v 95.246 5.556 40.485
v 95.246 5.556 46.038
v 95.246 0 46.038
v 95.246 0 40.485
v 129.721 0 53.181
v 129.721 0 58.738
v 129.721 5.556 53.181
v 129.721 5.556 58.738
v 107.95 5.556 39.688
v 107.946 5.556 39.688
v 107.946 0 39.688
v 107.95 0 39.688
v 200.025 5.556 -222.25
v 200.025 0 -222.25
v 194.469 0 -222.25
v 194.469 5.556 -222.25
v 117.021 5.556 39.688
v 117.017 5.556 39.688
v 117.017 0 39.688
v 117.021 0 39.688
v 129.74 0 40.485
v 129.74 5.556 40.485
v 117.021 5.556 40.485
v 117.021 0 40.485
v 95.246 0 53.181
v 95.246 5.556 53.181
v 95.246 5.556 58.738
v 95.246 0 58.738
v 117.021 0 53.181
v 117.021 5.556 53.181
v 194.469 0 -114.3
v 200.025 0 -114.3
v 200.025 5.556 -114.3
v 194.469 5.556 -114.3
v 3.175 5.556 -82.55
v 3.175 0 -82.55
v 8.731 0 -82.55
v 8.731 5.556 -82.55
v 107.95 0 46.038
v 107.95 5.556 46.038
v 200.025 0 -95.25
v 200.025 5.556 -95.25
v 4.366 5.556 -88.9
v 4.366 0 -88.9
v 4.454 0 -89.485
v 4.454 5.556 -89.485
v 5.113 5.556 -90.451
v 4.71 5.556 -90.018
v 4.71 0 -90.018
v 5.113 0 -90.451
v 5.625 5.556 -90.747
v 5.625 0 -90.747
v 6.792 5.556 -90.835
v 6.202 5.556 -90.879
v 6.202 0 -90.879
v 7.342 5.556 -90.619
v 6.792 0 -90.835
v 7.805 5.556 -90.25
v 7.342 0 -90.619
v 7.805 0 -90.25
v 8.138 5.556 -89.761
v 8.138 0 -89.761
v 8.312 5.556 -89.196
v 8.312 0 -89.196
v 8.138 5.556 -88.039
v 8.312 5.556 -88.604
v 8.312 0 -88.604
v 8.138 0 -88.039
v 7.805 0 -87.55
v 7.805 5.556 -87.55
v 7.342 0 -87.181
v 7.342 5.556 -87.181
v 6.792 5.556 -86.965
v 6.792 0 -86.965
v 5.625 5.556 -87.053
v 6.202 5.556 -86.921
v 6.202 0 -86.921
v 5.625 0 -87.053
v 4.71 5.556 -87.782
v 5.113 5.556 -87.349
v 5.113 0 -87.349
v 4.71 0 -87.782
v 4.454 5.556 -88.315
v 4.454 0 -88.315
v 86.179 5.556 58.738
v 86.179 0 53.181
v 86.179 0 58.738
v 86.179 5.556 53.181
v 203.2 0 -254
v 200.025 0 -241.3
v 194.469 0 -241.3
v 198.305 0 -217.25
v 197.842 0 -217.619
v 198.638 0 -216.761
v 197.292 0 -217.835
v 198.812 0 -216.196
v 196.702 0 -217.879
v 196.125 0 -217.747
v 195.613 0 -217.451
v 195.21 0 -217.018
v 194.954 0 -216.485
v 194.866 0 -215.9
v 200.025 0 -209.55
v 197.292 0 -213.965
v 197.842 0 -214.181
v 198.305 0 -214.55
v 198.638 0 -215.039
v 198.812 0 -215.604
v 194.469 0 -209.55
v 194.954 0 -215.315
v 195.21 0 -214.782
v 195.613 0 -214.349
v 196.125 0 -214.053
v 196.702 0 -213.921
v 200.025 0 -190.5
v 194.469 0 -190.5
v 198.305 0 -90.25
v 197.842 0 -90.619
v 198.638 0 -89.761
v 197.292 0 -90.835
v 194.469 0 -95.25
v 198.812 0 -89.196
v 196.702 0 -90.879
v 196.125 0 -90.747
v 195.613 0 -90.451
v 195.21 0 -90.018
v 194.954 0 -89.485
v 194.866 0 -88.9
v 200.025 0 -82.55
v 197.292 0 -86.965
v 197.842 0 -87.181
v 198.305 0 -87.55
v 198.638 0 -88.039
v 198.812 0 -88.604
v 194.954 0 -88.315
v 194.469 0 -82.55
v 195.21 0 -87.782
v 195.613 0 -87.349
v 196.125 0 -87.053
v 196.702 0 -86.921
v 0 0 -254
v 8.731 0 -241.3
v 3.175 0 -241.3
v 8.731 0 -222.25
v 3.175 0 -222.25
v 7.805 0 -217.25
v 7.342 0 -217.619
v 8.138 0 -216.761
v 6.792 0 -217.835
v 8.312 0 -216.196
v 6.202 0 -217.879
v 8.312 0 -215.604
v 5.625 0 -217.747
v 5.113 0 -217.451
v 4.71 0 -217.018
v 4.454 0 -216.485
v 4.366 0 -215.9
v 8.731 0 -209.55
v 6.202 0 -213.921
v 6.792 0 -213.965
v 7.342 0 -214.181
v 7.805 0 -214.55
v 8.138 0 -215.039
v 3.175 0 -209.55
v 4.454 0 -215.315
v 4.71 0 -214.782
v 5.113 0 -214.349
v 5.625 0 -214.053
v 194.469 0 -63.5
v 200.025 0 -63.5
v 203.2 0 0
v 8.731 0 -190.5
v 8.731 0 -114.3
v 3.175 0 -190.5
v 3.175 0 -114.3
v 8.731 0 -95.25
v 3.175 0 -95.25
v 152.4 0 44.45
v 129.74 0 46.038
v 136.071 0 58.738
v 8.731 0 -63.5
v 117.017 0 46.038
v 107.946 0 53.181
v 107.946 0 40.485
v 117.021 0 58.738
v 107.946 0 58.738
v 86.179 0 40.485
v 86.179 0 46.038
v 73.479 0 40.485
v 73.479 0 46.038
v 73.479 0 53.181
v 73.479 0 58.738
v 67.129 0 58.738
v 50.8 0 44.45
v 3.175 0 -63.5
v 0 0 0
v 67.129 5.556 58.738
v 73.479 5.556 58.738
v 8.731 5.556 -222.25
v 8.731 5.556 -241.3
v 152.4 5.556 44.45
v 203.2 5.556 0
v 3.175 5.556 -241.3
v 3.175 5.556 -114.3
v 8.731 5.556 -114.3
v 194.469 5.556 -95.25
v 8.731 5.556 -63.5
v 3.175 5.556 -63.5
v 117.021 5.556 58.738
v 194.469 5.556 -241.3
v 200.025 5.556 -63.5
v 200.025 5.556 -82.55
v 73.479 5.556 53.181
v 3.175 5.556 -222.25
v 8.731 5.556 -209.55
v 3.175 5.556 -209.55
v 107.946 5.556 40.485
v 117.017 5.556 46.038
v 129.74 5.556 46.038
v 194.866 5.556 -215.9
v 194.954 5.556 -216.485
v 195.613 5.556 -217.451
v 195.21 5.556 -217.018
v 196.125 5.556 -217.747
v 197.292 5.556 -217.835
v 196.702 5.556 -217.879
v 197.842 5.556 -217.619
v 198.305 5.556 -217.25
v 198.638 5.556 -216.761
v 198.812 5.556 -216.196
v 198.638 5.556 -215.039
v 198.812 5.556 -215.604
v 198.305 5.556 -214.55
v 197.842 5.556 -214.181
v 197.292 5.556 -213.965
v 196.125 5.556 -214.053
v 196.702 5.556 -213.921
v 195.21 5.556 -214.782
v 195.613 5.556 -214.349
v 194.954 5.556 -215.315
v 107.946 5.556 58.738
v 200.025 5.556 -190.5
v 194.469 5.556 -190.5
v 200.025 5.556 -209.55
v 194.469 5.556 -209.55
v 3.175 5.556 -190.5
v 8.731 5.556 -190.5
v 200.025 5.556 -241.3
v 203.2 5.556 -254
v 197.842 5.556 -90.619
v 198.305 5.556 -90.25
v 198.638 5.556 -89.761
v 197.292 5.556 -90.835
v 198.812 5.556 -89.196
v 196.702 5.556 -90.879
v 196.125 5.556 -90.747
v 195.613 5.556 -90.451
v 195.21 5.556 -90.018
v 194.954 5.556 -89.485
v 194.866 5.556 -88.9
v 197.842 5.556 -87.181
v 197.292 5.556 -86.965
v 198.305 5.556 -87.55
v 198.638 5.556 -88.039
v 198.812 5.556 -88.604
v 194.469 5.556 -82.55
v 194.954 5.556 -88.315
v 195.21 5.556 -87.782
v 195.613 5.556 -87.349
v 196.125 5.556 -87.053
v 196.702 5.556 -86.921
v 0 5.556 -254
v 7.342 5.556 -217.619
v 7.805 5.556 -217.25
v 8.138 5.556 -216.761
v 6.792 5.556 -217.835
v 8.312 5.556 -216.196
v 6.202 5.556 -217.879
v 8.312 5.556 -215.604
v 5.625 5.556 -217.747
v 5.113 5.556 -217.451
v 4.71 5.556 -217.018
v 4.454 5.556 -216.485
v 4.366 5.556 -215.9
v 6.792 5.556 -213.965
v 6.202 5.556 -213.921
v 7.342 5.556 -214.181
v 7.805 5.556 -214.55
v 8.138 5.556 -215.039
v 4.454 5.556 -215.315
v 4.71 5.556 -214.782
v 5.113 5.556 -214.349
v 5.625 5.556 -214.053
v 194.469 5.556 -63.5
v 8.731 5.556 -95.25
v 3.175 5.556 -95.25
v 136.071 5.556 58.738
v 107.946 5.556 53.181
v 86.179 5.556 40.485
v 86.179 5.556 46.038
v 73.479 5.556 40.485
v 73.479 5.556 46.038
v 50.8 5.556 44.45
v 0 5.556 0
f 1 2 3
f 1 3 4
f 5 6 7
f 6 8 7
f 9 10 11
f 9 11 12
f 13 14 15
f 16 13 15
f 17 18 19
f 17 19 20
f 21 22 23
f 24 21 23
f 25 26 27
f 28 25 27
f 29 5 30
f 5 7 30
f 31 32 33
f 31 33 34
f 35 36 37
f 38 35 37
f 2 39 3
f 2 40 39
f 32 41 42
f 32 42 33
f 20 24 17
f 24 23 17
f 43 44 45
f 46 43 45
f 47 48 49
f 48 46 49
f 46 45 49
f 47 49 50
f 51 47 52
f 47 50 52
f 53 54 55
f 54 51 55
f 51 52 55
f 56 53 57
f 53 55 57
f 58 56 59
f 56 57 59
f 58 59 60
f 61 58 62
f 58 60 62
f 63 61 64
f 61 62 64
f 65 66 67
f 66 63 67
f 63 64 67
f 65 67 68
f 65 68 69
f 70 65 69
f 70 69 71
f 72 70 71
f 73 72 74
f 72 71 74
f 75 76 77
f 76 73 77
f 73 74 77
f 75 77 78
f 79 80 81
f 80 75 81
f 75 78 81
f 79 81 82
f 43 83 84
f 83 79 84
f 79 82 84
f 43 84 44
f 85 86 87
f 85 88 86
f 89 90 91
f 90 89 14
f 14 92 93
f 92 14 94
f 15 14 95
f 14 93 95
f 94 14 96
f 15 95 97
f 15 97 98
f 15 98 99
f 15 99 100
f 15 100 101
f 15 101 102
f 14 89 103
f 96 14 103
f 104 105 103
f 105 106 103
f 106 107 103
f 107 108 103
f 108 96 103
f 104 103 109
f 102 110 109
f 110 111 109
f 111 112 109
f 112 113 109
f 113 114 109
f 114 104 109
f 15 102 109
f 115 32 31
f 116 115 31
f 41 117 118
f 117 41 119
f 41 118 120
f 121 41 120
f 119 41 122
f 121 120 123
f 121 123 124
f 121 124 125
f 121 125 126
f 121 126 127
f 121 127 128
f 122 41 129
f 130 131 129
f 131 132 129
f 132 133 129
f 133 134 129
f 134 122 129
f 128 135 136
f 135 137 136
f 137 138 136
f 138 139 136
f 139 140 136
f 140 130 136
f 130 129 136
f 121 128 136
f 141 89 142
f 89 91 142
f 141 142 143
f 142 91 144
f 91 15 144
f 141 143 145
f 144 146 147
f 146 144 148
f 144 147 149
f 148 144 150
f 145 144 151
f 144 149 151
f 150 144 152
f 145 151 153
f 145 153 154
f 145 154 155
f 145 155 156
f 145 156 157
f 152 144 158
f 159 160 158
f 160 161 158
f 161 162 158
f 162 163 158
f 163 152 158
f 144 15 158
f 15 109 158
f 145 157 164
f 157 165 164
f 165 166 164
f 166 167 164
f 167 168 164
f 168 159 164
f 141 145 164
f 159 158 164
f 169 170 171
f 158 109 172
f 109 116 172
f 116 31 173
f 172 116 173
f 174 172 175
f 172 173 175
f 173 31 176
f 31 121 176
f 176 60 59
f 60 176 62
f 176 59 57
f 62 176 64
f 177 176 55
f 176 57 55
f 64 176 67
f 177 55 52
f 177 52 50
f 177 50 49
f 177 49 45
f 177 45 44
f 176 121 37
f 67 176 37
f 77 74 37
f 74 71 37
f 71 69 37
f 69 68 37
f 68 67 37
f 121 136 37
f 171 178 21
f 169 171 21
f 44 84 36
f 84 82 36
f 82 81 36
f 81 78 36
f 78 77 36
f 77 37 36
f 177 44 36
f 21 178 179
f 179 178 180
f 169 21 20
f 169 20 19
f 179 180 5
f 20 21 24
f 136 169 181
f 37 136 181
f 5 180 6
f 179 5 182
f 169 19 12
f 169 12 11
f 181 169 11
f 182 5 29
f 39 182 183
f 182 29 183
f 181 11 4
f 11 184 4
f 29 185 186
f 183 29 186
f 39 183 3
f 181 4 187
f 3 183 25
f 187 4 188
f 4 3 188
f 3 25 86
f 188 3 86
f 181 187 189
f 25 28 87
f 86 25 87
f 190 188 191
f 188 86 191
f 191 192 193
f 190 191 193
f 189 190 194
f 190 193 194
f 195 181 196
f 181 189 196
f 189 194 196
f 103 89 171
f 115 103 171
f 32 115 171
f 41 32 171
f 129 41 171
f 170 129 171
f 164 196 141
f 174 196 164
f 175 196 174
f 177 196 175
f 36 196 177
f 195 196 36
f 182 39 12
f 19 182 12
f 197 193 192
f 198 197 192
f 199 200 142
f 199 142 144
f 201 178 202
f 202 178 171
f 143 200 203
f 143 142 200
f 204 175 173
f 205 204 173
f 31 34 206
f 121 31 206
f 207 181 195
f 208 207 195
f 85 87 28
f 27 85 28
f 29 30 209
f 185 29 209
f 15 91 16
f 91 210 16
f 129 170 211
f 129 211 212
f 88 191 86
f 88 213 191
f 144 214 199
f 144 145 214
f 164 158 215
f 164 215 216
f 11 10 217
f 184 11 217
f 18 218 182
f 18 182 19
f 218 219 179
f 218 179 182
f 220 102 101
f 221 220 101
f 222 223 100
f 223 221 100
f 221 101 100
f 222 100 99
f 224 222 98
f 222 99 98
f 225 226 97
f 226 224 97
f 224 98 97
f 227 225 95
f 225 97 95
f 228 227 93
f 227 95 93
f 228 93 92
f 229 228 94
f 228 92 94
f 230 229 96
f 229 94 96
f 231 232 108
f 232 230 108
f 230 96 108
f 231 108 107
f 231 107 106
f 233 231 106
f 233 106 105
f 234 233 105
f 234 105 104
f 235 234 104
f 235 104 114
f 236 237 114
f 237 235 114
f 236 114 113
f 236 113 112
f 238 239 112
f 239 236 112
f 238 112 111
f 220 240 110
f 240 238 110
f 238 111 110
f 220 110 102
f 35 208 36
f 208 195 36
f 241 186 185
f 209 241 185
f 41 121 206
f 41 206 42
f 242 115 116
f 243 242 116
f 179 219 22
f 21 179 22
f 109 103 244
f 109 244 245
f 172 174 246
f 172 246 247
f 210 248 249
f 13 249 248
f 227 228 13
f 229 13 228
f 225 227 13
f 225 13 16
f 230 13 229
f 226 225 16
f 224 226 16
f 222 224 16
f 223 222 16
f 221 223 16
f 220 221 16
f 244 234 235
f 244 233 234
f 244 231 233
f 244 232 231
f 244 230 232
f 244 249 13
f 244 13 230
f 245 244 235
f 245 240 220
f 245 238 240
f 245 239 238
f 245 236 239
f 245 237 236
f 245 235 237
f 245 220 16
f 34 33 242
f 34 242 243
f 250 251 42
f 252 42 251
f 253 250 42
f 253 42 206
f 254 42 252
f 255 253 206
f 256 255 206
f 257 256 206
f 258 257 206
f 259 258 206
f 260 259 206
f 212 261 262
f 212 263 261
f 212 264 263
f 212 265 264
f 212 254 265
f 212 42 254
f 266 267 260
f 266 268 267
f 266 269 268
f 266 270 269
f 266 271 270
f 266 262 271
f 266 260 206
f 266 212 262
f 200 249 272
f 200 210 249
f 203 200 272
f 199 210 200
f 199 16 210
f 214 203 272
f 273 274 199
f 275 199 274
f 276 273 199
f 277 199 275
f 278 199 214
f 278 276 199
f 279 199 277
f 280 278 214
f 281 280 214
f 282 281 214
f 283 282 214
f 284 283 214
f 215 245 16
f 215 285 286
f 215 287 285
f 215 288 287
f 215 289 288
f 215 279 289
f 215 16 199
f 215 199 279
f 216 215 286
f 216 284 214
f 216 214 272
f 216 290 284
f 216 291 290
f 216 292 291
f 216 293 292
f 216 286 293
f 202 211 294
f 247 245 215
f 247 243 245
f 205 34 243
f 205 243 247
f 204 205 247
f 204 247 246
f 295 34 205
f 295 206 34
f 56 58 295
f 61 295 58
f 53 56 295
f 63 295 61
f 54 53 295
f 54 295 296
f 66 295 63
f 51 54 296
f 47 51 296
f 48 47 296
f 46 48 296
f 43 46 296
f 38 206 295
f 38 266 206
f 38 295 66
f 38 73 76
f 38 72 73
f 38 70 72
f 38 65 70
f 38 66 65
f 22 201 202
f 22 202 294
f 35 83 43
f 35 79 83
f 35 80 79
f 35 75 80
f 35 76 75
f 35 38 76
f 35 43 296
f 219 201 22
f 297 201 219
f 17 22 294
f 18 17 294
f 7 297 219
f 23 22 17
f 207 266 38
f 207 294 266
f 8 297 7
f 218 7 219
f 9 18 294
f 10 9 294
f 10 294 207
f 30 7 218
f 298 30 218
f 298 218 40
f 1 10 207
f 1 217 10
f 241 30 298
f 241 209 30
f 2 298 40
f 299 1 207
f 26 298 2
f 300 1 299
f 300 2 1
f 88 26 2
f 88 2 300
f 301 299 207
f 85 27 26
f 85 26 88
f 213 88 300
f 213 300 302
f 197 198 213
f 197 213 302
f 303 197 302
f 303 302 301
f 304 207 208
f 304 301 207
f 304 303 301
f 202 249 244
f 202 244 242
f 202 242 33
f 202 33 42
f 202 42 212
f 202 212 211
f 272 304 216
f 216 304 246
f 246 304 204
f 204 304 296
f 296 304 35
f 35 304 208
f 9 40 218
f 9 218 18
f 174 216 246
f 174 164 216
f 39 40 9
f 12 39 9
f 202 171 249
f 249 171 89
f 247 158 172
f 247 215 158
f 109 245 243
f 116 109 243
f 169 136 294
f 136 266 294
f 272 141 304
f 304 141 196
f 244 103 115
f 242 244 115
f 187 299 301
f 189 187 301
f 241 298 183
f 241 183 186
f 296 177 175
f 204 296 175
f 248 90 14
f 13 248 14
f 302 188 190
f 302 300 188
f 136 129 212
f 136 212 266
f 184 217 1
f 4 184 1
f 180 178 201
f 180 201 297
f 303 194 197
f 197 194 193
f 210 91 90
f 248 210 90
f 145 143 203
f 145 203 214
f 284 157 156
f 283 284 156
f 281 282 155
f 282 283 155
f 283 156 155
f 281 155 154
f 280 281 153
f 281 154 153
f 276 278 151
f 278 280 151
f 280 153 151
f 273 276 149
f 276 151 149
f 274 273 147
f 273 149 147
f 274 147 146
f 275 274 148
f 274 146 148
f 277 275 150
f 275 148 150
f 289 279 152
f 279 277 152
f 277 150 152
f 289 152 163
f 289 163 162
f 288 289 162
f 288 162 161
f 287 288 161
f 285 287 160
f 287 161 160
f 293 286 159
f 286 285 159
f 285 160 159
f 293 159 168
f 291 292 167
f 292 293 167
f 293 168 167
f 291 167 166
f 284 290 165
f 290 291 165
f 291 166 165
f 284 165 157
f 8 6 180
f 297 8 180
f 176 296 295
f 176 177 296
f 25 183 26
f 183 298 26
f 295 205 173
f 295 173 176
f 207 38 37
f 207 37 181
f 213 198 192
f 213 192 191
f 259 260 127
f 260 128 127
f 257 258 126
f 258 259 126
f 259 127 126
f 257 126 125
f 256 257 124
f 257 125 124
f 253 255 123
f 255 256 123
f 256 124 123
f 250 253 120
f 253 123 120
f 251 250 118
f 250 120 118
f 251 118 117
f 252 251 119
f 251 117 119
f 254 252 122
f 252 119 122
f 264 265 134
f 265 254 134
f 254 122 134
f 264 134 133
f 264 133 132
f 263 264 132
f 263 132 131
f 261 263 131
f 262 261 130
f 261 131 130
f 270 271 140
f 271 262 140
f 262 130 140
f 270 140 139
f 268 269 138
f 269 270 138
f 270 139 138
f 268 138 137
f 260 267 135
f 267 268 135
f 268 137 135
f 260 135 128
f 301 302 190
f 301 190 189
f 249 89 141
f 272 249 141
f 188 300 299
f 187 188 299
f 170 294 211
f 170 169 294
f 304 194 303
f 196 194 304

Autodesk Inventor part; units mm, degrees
ref_plane "YZ Plane" through (0, 0, 0) normal (1, 0, 0) x (0, 1, 0)
ref_plane "XZ Plane" through (0, 0, 0) normal (0, 1, 0) x (-1, 0, 0)
ref_plane "XY Plane" through (0, 0, 0) normal (0, 0, 1) x (1, 0, 0)
sketch "Sketch1" plane through (0, 0, 0) normal (0, 1, 0) x (-1, 0, 0)
  point P0 (0, 0)
sketch "Sketch4" plane through (0, 0, 0) normal (0, 1, 0) x (-1, 0, 0)
  line L0 (-203.2, 0) -> (-203.2, -254)
  line L1 (-203.2, -254) -> (0, -254)
  line L2 (0, -254) -> (0, 0)
  line L3 (-101.6, 44.45) -> (-50.8, 44.45)
  line L4 (-50.8, 44.45) -> (0, 0)
  line L5 (-101.6, 44.45) -> (-152.4, 44.45)
  line L6 (-152.4, 44.45) -> (-203.2, 0)
  line L7 (-152.4, 44.45) -> (-136.0714, 58.7375)
  line L8 (-50.8, 44.45) -> (-67.1286, 58.7375)
  line L9 (-67.1286, 58.7375) -> (-136.0714, 58.7375)
  line L10 (0, -254) -> (0, -241.3)
  line L11 (-3.175, -241.3) -> (-3.175, -222.25)
  line L12 (-3.175, -222.25) -> (-9.525, -222.25)
  line L13 (-9.525, -222.25) -> (-9.525, -241.3)
  line L14 (-9.525, -241.3) -> (-3.175, -241.3)
  circle A0 centre (-6.35, -215.9) radius 4.7625
  circle A1 centre (-6.35, -215.9) radius 1.9844
  line L15 (-6.35, -209.55) -> (-9.525, -209.55)
  line L16 (-6.35, -209.55) -> (-3.175, -209.55)
  line L17 (-3.175, -209.55) -> (-3.175, -190.5)
  line L18 (-3.175, -190.5) -> (-9.525, -190.5)
  line L19 (-9.525, -190.5) -> (-9.525, -209.55)
  line L20 (-200.025, -241.3) -> (-200.025, -222.25)
  line L21 (-200.025, -222.25) -> (-193.675, -222.25)
  line L22 (-193.675, -222.25) -> (-193.675, -241.3)
  line L23 (-193.675, -241.3) -> (-200.025, -241.3)
  circle A2 centre (-196.85, -215.9) radius 4.7625
  circle A3 centre (-196.85, -215.9) radius 1.9844
  line L24 (-196.85, -209.55) -> (-193.675, -209.55)
  line L25 (-196.85, -209.55) -> (-200.025, -209.55)
  line L26 (-200.025, -209.55) -> (-200.025, -190.5)
  line L27 (-200.025, -190.5) -> (-193.675, -190.5)
  line L28 (-193.675, -190.5) -> (-193.675, -209.55)
  line L29 (-3.175, -63.5) -> (-3.175, -82.55)
  line L30 (-3.175, -82.55) -> (-9.525, -82.55)
  line L31 (-9.525, -82.55) -> (-9.525, -63.5)
  line L32 (-9.525, -63.5) -> (-3.175, -63.5)
  circle A4 centre (-6.35, -88.9) radius 4.7625
  circle A5 centre (-6.35, -88.9) radius 1.9844
  line L33 (-6.35, -95.25) -> (-9.525, -95.25)
  line L34 (-6.35, -95.25) -> (-3.175, -95.25)
  line L35 (-3.175, -95.25) -> (-3.175, -114.3)
  line L36 (-3.175, -114.3) -> (-9.525, -114.3)
  line L37 (-9.525, -114.3) -> (-9.525, -95.25)
  line L38 (-193.675, -63.5) -> (-200.025, -63.5)
  line L39 (-200.025, -63.5) -> (-200.025, -82.55)
  line L40 (-193.675, -82.55) -> (-193.675, -63.5)
  line L41 (-200.025, -82.55) -> (-193.675, -82.55)
  circle A6 centre (-196.85, -88.9) radius 4.7625
  line L42 (-196.85, -95.25) -> (-200.025, -95.25)
  line L43 (-196.85, -95.25) -> (-193.675, -95.25)
  line L44 (-200.025, -95.25) -> (-200.025, -114.3)
  line L45 (-200.025, -114.3) -> (-193.675, -114.3)
  line L46 (-193.675, -114.3) -> (-193.675, -95.25)
  circle A7 centre (-196.85, -88.9) radius 1.9844
  dimension "d18" = 203.2
  dimension "d19" = 254
  dimension "d29" = 19.05
  dimension "d30" = 6.35
  dimension "d32" = 9.525
  dimension "d33" = 3.9688
  dimension "d35" = 3.175
  dimension "d36" = 19.05
extrude "Extrusion2" add sketch "Sketch4" along normal blind 5.5563 contours L6 L5 L3 L4 L2 L1 L0 | L7 L9 L8 L3 L5 | A0 | A2 | A4 | A6
sketch "Sketch5" plane through (0, 5.5563, 0) normal (0, 1, 0) x (1, 0, 0)
  line L0 (67.1286, -58.7375) -> (136.0714, -58.7375) projected
  line L1 (136.0714, -58.7375) -> (129.7214, -58.7375)
  line L2 (129.7214, -58.7375) -> (129.7214, -52.3875)
  line L3 (129.7214, -52.3875) -> (117.0214, -52.3875)
  line L4 (117.0214, -52.3875) -> (117.0214, -58.7375)
  line L5 (117.0214, -58.7375) -> (104.3214, -58.7375)
  line L6 (0, 0) -> (67.1286, -58.7375) projected
  line L7 (67.1286, -58.7375) -> (73.4786, -58.7375)
  line L8 (73.4786, -58.7375) -> (73.4786, -52.3875)
  line L9 (73.4786, -52.3875) -> (86.1786, -52.3875)
  line L10 (86.1786, -52.3875) -> (86.1786, -58.7375)
  line L11 (86.1786, -58.7375) -> (101.5964, -58.7375)
  line L12 (101.5964, -52.3875) -> (95.2464, -52.3875)
  line L13 (101.5964, -52.3875) -> (107.9464, -52.3875)
  line L14 (107.9464, -52.3875) -> (107.9464, -58.7375)
  line L15 (95.2464, -52.3875) -> (95.2464, -58.7375)
  line L16 (73.4786, -58.7375) -> (86.1786, -58.7375)
extrude "Extrusion3" cut sketch "Sketch5" against normal blind 25.4
sketch "Sketch6" plane through (0, 5.5563, 0) normal (0, 1, 0) x (1, 0, 0)
  line L0 (73.4786, -52.3875) -> (86.1786, -52.3875) projected
  line L1 (73.4786, -46.0375) -> (73.4786, -39.6875)
  line L2 (73.4786, -39.6875) -> (73.4786, -46.0375)
  line L3 (129.74, -46.0375) -> (129.74, -39.6875)
  line L4 (129.74, -39.6875) -> (129.74, -46.0375)
  line L5 (86.1786, -46.0375) -> (86.1786, -39.6875)
  line L6 (95.2464, -46.0375) -> (95.2464, -39.6875)
  line L7 (117.0167, -46.0375) -> (117.0167, -39.6875)
  line L8 (107.95, -46.0375) -> (107.95, -39.6875)
  line L9 (73.4786, -39.6875) -> (86.1786, -39.6875)
  line L10 (95.2464, -39.6875) -> (107.95, -39.6875)
  line L11 (117.0167, -39.6875) -> (129.74, -39.6875)
  line L12 (129.74, -46.0375) -> (117.0167, -46.0375)
  line L13 (107.95, -46.0375) -> (95.2464, -46.0375)
  line L14 (86.1786, -46.0375) -> (73.4786, -46.0375)
  point P0 (0, 0)
  point P1 (95.2464, -52.3875)
extrude "Extrusion4" cut sketch "Sketch6" against normal blind 25.4
sketch "Sketch7" plane through (0, 5.5563, 0) normal (0, 1, 0) x (1, 0, 0)
  line L0 (3.175, 63.5) -> (3.175, 82.55) projected
  line L1 (3.175, 73.025) -> (8.7313, 73.025)
  line L2 (9.525, 82.55) -> (3.175, 82.55) projected
  line L3 (3.175, 63.5) -> (9.525, 63.5) projected
  line L4 (9.525, 82.55) -> (8.7313, 82.55)
  line L5 (8.7313, 82.55) -> (8.7313, 63.5)
  line L6 (8.7313, 63.5) -> (9.525, 63.5)
  line L7 (9.525, 63.5) -> (9.525, 82.55)
  line L8 (9.525, 114.3) -> (8.7313, 114.3)
  line L9 (8.7313, 114.3) -> (8.7313, 95.25)
  line L10 (8.7313, 95.25) -> (9.525, 95.25)
  line L11 (9.525, 95.25) -> (9.525, 114.3)
  line L12 (3.175, 209.55) -> (9.525, 209.55) projected
  line L13 (3.175, 190.5) -> (9.525, 190.5) projected
  line L14 (9.525, 209.55) -> (8.7313, 209.55)
  line L15 (8.7313, 209.55) -> (8.7313, 190.5)
  line L16 (8.7313, 190.5) -> (9.525, 190.5)
  line L17 (9.525, 190.5) -> (9.525, 209.55)
  line L18 (9.525, 241.3) -> (9.525, 222.25) projected
  line L19 (9.525, 241.3) -> (9.1281, 241.3)
  line L20 (9.1281, 222.25) -> (9.525, 222.25)
  line L21 (9.525, 222.25) -> (9.525, 241.3)
  line L22 (3.175, 222.25) -> (3.175, 241.3) projected
  line L23 (9.525, 241.3) -> (8.7313, 241.3)
  line L24 (8.7313, 241.3) -> (8.7313, 222.25)
  line L25 (8.7313, 222.25) -> (9.525, 222.25)
  line L26 (9.525, 222.25) -> (9.525, 241.3)
  line L27 (200.025, 241.3) -> (200.025, 222.25) projected
  line L28 (200.025, 231.775) -> (194.4688, 231.775)
  line L29 (193.675, 241.3) -> (193.675, 222.25) projected
  line L30 (193.675, 241.3) -> (194.4688, 241.3)
  line L31 (194.4688, 241.3) -> (194.4688, 222.25)
  line L32 (194.4688, 222.25) -> (193.675, 222.25)
  line L33 (193.675, 222.25) -> (193.675, 241.3)
  line L34 (193.675, 209.55) -> (193.675, 190.5) projected
  line L35 (200.025, 190.5) -> (193.675, 190.5) projected
  line L36 (193.675, 209.55) -> (194.4688, 209.55)
  line L37 (194.4688, 209.55) -> (194.4688, 190.5)
  line L38 (194.4688, 190.5) -> (193.675, 190.5)
  line L39 (193.675, 190.5) -> (193.675, 209.55)
  line L40 (193.675, 114.3) -> (194.4688, 114.3)
  line L41 (194.4688, 114.3) -> (194.4688, 95.25)
  line L42 (194.4688, 95.25) -> (193.675, 95.25)
  line L43 (193.675, 95.25) -> (193.675, 114.3)
  line L44 (193.675, 82.55) -> (193.675, 63.5) projected
  line L45 (193.675, 82.55) -> (194.4688, 82.55)
  line L46 (194.4688, 82.55) -> (194.4688, 63.5)
  line L47 (194.4688, 63.5) -> (193.675, 63.5)
  line L48 (193.675, 63.5) -> (193.675, 82.55)
  line L49 (86.1786, -52.3875) -> (86.1786, -58.7375) projected
  line L50 (73.4786, -52.3875) -> (73.4786, -58.7375) projected
  line L51 (86.1786, -52.3875) -> (73.4786, -52.3875)
  line L52 (73.4786, -52.3875) -> (73.4786, -53.1813)
  line L53 (73.4786, -53.1813) -> (86.1786, -53.1813)
  line L54 (86.1786, -53.1813) -> (86.1786, -52.3875)
  line L55 (95.2464, -58.7375) -> (95.2464, -52.3875) projected
  line L56 (107.9464, -52.3875) -> (107.9464, -58.7375) projected
  line L57 (95.2464, -52.3875) -> (107.9464, -52.3875)
  line L58 (107.9464, -52.3875) -> (107.9464, -53.1813)
  line L59 (107.9464, -53.1813) -> (95.2464, -53.1813)
  line L60 (95.2464, -53.1813) -> (95.2464, -52.3875)
  line L61 (117.0214, -52.3875) -> (130.175, -52.3875)
  line L62 (130.175, -52.3875) -> (130.175, -53.1813)
  line L63 (130.175, -53.1813) -> (117.0214, -53.1813)
  line L64 (117.0214, -53.1813) -> (117.0214, -52.3875)
  line L65 (86.1786, -46.0375) -> (86.1786, -39.6875) projected
  line L66 (73.4786, -39.6875) -> (86.1786, -39.6875)
  line L67 (86.1786, -39.6875) -> (86.1786, -40.4853)
  line L68 (86.1786, -40.4853) -> (73.4786, -40.4853)
  line L69 (73.4786, -40.4853) -> (73.4786, -39.6875)
  line L70 (95.2464, -39.6875) -> (107.9464, -39.6875)
  line L71 (107.9464, -39.6875) -> (107.9464, -40.4853)
  line L72 (107.9464, -40.4853) -> (95.2464, -40.4853)
  line L73 (95.2464, -40.4853) -> (95.2464, -39.6875)
  line L74 (117.0214, -39.6875) -> (129.74, -39.6875)
  line L75 (129.74, -39.6875) -> (129.74, -40.4853)
  line L76 (129.74, -40.4853) -> (117.0214, -40.4853)
  line L77 (117.0214, -40.4853) -> (117.0214, -39.6875)
  point P0 (0, 0)
  dimension "d65" = 5.5563
  dimension "d67" = 5.5563
extrude "Extrusion5" add sketch "Sketch7" against normal blind 5.5563 contours L5 L2 L7 L3 | L11 L10 L9 L8 | L12 L17 L13 L15 | L18 L20 L25 L24 L23 L19 | L30 L31 L32 L29 | L36 L37 L35 L34 | L40 L41 L42 L43 | L45 L46 L47 L44 | L49 L53 L50 L51 | L55 L57 L56 L59 | L61 L62 L63 L64 | L68 L69 L66 L65 | L70 L71 L72 L73 | L74 L75 L76 L77
properties part number "base"
